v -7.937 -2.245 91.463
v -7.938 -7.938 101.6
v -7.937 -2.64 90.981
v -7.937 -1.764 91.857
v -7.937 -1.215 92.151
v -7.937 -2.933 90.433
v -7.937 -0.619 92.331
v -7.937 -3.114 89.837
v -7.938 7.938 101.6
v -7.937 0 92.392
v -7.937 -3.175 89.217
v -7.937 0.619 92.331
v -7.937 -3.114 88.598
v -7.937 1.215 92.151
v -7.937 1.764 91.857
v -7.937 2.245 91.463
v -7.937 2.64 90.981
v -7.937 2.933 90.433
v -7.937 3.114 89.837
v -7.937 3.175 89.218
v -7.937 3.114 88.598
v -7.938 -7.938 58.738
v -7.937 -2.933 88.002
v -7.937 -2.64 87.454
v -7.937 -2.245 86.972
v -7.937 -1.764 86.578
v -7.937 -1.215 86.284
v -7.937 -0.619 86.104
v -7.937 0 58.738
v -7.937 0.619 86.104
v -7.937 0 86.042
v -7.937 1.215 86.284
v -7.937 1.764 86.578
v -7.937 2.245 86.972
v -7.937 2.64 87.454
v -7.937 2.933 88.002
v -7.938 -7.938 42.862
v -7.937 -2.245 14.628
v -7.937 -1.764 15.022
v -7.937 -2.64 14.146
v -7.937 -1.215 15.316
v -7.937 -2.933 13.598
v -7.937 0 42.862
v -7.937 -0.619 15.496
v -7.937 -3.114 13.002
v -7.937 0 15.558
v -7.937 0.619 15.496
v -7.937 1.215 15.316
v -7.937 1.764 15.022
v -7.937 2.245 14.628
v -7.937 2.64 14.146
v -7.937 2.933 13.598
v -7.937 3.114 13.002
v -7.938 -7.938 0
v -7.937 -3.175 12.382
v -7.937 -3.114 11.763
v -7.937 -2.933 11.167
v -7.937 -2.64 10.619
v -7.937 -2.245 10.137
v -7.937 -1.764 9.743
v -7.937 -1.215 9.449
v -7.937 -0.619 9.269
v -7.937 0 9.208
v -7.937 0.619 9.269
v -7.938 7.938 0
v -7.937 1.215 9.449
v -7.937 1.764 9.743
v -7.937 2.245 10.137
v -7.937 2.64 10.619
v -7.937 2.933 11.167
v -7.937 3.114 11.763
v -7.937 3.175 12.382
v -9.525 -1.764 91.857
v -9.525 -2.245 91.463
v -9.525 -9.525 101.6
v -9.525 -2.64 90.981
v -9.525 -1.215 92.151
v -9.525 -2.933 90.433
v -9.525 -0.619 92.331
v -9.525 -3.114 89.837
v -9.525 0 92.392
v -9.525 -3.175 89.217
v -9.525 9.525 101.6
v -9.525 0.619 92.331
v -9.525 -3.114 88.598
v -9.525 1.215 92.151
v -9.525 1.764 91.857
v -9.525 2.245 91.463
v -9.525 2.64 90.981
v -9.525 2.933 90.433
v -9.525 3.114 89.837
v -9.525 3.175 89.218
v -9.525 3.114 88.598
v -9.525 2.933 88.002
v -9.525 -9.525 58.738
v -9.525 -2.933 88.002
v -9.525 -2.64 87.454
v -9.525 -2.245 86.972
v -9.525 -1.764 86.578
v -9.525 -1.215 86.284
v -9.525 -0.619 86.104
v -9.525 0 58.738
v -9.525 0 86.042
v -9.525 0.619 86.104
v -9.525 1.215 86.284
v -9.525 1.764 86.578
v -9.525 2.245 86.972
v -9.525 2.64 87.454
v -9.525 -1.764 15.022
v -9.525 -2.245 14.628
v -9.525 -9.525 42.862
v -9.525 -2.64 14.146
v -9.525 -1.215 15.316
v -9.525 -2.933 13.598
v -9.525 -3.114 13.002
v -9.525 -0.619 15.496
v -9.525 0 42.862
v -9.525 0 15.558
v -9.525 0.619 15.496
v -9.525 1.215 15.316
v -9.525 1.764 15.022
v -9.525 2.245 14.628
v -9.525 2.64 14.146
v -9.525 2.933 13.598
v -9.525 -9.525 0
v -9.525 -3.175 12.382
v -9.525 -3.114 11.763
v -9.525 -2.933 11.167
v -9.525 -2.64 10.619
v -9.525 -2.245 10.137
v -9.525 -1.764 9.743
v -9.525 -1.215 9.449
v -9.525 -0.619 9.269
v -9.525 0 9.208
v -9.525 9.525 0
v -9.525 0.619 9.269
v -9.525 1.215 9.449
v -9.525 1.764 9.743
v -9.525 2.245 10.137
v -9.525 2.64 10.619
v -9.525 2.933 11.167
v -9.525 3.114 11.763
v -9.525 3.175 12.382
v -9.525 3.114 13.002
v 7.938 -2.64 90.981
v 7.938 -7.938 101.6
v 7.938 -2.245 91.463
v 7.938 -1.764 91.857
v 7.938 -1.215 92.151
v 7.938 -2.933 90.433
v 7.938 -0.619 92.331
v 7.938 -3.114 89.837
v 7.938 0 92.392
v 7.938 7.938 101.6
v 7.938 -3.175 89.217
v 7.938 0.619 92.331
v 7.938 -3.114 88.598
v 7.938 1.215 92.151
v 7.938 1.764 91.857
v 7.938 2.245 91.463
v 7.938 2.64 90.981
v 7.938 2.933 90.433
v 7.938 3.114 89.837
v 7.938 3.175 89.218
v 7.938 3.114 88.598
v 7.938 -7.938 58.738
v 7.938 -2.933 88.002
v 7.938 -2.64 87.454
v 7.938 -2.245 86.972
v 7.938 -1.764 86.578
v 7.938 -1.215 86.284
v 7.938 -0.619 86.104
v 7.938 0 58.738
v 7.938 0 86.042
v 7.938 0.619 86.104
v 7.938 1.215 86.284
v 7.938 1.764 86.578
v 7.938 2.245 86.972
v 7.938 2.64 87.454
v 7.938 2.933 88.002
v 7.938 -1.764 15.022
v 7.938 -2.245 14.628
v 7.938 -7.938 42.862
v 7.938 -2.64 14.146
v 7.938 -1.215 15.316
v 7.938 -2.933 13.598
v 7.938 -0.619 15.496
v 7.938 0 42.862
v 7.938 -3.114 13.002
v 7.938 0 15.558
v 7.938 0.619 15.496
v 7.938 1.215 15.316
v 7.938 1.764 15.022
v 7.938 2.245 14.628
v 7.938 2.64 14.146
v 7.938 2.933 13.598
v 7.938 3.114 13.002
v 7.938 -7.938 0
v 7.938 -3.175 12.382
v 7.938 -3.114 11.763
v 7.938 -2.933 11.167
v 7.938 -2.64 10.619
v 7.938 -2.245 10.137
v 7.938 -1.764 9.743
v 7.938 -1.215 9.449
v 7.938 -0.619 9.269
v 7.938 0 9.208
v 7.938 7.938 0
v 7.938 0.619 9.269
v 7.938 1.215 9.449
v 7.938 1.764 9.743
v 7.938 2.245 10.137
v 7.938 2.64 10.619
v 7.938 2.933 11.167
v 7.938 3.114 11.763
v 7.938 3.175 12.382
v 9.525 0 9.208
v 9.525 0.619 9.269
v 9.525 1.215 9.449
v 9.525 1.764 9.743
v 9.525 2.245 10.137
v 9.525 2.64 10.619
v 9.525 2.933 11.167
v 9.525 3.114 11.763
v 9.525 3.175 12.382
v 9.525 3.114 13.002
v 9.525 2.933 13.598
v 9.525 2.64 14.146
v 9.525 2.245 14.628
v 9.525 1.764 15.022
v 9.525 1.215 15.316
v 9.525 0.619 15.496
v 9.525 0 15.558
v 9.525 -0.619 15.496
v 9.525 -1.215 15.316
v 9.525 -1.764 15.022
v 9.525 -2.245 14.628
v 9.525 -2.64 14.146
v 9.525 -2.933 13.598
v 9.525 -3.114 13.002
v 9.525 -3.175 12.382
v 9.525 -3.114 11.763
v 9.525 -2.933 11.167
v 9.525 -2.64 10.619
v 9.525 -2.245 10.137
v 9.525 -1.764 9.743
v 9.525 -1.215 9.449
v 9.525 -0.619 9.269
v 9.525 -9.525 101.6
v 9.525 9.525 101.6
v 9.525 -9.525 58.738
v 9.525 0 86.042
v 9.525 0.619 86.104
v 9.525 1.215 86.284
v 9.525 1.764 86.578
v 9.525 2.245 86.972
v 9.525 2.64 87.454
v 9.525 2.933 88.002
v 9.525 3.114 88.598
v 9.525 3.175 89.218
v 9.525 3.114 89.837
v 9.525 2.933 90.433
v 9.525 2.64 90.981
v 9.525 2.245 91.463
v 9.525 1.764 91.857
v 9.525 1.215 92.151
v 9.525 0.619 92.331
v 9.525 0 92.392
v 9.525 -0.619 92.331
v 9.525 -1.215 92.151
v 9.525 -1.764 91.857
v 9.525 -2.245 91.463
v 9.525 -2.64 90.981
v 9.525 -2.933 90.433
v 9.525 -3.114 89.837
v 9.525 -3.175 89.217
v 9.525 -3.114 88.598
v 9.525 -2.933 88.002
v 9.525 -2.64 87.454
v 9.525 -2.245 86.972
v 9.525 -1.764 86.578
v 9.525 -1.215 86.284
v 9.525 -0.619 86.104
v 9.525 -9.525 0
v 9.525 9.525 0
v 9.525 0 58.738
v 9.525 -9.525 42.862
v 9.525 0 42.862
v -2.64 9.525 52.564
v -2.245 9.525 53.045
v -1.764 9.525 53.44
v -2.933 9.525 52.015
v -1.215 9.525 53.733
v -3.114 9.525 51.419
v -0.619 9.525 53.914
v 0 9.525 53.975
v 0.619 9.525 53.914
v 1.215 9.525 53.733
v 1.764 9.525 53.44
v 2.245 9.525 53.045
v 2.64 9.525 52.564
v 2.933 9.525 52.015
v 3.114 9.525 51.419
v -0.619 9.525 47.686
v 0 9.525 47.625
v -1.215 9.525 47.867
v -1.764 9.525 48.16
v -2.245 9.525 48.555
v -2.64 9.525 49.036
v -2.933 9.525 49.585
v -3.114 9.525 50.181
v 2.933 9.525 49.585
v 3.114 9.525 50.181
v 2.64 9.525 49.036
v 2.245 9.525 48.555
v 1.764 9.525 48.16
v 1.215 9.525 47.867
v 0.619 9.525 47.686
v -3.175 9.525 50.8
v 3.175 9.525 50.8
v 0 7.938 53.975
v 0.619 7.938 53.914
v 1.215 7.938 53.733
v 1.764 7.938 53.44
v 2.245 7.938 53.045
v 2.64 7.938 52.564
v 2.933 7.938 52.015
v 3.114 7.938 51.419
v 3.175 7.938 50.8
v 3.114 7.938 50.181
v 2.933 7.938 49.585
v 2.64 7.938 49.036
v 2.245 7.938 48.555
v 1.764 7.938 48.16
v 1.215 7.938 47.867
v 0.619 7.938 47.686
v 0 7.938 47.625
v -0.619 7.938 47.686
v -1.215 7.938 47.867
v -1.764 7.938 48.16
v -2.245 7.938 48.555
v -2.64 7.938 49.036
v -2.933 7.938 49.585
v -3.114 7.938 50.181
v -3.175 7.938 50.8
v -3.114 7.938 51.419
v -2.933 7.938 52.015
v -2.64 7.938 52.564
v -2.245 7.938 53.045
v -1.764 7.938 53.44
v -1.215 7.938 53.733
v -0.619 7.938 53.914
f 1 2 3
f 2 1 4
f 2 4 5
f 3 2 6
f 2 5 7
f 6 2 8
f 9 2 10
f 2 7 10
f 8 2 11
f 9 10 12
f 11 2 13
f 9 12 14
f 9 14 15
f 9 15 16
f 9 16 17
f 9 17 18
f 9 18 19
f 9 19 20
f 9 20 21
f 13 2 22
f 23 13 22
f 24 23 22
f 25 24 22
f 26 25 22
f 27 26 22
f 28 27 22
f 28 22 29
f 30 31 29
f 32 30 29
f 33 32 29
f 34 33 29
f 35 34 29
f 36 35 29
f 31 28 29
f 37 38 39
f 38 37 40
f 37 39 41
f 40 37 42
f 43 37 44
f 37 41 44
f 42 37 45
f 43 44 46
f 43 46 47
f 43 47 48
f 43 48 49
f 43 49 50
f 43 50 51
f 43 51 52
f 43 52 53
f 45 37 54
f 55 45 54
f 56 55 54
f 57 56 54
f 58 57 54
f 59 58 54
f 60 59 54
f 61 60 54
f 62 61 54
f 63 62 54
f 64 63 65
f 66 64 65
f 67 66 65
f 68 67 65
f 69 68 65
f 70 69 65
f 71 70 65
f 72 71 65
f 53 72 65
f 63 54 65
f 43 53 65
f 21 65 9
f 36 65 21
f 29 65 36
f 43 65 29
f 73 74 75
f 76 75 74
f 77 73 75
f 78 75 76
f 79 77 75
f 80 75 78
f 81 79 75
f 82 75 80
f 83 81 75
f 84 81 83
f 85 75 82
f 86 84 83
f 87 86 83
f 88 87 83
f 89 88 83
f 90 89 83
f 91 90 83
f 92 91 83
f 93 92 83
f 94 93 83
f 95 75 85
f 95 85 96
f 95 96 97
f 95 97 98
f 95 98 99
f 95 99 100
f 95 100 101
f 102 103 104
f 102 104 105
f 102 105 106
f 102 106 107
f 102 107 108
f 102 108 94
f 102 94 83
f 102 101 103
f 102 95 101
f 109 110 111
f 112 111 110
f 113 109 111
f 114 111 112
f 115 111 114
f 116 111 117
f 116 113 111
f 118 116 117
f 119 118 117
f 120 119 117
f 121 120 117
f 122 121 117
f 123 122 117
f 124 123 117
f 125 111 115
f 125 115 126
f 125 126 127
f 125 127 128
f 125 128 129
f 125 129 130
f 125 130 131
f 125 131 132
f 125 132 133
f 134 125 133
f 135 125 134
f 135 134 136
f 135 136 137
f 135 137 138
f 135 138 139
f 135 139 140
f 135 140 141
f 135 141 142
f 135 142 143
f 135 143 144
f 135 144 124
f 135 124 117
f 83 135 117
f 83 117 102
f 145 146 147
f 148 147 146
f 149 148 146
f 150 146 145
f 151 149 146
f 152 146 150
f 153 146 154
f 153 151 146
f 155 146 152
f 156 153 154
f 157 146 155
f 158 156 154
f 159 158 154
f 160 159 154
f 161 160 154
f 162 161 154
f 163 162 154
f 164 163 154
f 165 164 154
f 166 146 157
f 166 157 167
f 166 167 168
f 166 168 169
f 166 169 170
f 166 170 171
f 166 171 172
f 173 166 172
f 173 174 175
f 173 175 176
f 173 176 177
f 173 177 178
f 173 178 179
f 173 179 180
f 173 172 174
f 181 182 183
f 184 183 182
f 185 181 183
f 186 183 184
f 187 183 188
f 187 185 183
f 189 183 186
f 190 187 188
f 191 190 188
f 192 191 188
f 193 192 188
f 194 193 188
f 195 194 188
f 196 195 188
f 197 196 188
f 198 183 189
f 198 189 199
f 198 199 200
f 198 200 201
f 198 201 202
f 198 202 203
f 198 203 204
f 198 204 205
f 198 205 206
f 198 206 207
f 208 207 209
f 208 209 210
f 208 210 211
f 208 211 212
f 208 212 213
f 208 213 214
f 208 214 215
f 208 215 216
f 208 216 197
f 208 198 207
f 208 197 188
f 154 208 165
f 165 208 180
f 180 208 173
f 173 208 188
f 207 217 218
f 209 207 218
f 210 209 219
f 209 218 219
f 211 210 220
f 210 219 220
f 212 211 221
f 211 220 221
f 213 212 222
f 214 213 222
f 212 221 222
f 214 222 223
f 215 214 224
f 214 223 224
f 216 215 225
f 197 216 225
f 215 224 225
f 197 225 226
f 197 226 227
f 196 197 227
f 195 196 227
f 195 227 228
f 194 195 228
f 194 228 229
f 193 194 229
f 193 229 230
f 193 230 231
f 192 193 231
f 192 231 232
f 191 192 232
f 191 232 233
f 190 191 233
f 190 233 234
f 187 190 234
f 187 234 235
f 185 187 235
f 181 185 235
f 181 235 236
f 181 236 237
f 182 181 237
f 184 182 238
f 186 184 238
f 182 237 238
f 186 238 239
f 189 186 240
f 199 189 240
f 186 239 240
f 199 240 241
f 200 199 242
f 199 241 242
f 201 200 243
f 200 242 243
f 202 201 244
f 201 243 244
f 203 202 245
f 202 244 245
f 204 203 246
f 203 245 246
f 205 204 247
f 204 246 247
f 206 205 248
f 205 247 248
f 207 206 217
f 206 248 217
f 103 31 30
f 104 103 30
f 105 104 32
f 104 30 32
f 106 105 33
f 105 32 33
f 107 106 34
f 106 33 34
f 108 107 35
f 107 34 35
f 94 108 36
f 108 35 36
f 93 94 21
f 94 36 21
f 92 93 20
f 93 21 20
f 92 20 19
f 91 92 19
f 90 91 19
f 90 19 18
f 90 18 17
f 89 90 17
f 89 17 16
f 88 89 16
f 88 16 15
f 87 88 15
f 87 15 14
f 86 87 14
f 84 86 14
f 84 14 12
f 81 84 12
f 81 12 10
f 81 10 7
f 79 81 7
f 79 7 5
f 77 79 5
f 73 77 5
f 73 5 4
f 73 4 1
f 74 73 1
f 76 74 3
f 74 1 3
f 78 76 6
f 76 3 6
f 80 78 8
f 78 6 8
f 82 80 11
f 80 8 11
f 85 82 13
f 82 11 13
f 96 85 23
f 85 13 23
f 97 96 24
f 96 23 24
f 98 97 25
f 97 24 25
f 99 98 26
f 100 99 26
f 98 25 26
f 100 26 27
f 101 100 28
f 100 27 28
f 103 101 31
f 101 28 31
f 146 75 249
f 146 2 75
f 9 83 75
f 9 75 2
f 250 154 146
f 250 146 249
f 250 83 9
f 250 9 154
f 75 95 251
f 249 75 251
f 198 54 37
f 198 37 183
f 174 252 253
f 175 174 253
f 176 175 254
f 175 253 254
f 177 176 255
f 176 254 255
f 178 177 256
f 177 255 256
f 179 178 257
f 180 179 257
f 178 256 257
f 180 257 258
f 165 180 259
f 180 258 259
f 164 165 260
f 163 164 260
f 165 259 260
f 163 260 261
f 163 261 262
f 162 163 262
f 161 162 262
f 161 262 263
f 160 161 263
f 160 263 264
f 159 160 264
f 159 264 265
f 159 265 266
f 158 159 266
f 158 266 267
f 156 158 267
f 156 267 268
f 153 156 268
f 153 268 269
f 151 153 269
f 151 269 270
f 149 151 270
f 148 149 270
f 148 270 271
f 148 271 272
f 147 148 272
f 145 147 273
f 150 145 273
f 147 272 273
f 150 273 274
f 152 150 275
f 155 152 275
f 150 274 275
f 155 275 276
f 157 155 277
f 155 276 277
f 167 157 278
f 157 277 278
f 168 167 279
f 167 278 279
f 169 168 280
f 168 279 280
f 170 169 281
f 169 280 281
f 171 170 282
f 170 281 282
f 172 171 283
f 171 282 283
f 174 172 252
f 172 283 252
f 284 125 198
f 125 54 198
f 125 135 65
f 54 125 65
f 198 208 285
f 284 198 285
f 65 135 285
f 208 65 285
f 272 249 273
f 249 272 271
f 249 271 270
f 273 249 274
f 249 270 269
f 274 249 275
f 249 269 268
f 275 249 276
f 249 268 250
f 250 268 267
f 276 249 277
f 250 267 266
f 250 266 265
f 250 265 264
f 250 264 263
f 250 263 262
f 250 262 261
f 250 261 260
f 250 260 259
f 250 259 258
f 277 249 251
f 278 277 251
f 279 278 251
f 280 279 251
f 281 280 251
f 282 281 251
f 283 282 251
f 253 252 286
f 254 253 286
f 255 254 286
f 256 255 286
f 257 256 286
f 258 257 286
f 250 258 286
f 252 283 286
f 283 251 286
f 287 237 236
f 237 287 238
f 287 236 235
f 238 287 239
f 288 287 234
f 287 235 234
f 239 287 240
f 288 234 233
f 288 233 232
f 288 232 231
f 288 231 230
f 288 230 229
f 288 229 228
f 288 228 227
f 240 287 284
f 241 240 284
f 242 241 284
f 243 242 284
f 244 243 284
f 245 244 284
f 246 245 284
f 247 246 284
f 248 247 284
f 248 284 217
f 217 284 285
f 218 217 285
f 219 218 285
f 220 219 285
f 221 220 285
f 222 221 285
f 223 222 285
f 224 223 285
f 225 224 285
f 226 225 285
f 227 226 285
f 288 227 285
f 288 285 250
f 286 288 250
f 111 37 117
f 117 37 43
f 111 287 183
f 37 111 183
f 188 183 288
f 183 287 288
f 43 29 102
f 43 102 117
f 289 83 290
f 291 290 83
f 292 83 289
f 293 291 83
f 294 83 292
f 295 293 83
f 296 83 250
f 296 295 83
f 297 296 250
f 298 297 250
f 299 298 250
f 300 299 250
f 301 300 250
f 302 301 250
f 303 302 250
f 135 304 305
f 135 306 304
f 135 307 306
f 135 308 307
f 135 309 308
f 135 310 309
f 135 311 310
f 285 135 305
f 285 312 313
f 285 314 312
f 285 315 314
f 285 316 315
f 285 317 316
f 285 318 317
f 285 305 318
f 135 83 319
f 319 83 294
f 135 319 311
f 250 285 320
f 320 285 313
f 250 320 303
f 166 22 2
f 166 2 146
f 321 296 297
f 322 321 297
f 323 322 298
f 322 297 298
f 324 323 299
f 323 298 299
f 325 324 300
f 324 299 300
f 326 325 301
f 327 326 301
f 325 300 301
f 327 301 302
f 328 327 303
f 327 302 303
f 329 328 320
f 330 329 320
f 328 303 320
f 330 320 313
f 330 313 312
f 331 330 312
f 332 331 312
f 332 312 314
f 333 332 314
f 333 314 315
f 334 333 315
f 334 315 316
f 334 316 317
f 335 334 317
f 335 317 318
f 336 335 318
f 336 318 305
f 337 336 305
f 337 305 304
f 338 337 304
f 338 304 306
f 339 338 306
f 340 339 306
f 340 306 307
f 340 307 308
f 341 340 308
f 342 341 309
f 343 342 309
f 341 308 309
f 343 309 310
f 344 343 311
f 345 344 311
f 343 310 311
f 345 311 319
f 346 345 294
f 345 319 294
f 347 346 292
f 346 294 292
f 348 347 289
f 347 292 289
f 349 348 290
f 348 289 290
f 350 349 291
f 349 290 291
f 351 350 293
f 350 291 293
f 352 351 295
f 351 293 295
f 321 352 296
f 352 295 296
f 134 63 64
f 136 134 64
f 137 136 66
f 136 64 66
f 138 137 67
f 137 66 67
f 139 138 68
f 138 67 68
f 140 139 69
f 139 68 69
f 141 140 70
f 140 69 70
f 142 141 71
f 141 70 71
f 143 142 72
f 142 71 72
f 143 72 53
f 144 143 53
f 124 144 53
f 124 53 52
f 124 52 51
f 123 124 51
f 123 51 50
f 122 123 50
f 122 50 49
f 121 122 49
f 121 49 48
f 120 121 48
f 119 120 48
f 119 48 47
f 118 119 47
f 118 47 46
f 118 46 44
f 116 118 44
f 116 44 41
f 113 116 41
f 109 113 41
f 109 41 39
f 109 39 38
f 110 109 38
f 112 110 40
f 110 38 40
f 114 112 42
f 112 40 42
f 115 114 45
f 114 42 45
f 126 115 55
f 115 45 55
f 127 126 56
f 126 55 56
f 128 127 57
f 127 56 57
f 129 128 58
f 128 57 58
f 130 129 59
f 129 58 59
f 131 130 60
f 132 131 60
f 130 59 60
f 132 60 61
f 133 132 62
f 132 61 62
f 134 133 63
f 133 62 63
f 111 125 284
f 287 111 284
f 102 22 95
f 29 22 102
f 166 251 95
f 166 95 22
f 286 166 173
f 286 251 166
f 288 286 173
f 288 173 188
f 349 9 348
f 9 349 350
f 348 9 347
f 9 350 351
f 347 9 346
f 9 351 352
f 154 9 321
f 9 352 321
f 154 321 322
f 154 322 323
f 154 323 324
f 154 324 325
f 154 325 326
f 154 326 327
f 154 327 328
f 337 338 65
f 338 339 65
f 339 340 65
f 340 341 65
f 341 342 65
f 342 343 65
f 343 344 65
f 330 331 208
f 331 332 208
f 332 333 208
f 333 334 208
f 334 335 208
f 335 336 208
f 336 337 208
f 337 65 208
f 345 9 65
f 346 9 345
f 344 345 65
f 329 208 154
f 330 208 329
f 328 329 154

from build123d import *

# Parameters (mm, degrees)
SKETCH1_W           = 19.05
SKETCH1_H           = 19.05
SKETCH1_W_2         = 15.875
SKETCH1_H_2         = 15.875
BOSS_EXTRUDE1_DEPTH = 101.6
SKETCH2_R           = 3.175
CUT_EXTRUDE1_DEPTH  = 104.808420299
SKETCH3_R           = 3.175
SKETCH3_W           = 15.875
SKETCH3_H           = 9.525
CUT_EXTRUDE2_DEPTH  = 104.808420299


with BuildPart() as part:
    # Sketch1 → Boss-Extrude1 (new body)
    with BuildSketch(Plane.XY):
        Rectangle(SKETCH1_W, SKETCH1_H)
        Rectangle(SKETCH1_W_2, SKETCH1_H_2, mode=Mode.SUBTRACT)
    extrude(amount=BOSS_EXTRUDE1_DEPTH)

    # Sketch2 → Cut-Extrude1 (cut, through all)
    with BuildSketch(Plane(origin=(0, 9.525, 0), x_dir=(1, 0, 0), z_dir=(0, 1, 0))):
        with Locations(Location((0, -50.8, 0), (0, 0, 270))):
            Circle(SKETCH2_R)
    extrude(amount=-CUT_EXTRUDE1_DEPTH, mode=Mode.SUBTRACT)

    # Sketch3 → Cut-Extrude2 (cut, through all)
    with BuildSketch(Plane(origin=(9.525, 0, 0), x_dir=(0, 0, -1), z_dir=(1, 0, 0))):
        with Locations((-89.2175, 0)):
            Circle(SKETCH3_R)
        with Locations((-12.3825, 0)):
            Circle(SKETCH3_R)
        with Locations((-50.8, -4.7625)):
            Rectangle(SKETCH3_W, SKETCH3_H)
    extrude(amount=-CUT_EXTRUDE2_DEPTH, mode=Mode.SUBTRACT)


solid = part.part
